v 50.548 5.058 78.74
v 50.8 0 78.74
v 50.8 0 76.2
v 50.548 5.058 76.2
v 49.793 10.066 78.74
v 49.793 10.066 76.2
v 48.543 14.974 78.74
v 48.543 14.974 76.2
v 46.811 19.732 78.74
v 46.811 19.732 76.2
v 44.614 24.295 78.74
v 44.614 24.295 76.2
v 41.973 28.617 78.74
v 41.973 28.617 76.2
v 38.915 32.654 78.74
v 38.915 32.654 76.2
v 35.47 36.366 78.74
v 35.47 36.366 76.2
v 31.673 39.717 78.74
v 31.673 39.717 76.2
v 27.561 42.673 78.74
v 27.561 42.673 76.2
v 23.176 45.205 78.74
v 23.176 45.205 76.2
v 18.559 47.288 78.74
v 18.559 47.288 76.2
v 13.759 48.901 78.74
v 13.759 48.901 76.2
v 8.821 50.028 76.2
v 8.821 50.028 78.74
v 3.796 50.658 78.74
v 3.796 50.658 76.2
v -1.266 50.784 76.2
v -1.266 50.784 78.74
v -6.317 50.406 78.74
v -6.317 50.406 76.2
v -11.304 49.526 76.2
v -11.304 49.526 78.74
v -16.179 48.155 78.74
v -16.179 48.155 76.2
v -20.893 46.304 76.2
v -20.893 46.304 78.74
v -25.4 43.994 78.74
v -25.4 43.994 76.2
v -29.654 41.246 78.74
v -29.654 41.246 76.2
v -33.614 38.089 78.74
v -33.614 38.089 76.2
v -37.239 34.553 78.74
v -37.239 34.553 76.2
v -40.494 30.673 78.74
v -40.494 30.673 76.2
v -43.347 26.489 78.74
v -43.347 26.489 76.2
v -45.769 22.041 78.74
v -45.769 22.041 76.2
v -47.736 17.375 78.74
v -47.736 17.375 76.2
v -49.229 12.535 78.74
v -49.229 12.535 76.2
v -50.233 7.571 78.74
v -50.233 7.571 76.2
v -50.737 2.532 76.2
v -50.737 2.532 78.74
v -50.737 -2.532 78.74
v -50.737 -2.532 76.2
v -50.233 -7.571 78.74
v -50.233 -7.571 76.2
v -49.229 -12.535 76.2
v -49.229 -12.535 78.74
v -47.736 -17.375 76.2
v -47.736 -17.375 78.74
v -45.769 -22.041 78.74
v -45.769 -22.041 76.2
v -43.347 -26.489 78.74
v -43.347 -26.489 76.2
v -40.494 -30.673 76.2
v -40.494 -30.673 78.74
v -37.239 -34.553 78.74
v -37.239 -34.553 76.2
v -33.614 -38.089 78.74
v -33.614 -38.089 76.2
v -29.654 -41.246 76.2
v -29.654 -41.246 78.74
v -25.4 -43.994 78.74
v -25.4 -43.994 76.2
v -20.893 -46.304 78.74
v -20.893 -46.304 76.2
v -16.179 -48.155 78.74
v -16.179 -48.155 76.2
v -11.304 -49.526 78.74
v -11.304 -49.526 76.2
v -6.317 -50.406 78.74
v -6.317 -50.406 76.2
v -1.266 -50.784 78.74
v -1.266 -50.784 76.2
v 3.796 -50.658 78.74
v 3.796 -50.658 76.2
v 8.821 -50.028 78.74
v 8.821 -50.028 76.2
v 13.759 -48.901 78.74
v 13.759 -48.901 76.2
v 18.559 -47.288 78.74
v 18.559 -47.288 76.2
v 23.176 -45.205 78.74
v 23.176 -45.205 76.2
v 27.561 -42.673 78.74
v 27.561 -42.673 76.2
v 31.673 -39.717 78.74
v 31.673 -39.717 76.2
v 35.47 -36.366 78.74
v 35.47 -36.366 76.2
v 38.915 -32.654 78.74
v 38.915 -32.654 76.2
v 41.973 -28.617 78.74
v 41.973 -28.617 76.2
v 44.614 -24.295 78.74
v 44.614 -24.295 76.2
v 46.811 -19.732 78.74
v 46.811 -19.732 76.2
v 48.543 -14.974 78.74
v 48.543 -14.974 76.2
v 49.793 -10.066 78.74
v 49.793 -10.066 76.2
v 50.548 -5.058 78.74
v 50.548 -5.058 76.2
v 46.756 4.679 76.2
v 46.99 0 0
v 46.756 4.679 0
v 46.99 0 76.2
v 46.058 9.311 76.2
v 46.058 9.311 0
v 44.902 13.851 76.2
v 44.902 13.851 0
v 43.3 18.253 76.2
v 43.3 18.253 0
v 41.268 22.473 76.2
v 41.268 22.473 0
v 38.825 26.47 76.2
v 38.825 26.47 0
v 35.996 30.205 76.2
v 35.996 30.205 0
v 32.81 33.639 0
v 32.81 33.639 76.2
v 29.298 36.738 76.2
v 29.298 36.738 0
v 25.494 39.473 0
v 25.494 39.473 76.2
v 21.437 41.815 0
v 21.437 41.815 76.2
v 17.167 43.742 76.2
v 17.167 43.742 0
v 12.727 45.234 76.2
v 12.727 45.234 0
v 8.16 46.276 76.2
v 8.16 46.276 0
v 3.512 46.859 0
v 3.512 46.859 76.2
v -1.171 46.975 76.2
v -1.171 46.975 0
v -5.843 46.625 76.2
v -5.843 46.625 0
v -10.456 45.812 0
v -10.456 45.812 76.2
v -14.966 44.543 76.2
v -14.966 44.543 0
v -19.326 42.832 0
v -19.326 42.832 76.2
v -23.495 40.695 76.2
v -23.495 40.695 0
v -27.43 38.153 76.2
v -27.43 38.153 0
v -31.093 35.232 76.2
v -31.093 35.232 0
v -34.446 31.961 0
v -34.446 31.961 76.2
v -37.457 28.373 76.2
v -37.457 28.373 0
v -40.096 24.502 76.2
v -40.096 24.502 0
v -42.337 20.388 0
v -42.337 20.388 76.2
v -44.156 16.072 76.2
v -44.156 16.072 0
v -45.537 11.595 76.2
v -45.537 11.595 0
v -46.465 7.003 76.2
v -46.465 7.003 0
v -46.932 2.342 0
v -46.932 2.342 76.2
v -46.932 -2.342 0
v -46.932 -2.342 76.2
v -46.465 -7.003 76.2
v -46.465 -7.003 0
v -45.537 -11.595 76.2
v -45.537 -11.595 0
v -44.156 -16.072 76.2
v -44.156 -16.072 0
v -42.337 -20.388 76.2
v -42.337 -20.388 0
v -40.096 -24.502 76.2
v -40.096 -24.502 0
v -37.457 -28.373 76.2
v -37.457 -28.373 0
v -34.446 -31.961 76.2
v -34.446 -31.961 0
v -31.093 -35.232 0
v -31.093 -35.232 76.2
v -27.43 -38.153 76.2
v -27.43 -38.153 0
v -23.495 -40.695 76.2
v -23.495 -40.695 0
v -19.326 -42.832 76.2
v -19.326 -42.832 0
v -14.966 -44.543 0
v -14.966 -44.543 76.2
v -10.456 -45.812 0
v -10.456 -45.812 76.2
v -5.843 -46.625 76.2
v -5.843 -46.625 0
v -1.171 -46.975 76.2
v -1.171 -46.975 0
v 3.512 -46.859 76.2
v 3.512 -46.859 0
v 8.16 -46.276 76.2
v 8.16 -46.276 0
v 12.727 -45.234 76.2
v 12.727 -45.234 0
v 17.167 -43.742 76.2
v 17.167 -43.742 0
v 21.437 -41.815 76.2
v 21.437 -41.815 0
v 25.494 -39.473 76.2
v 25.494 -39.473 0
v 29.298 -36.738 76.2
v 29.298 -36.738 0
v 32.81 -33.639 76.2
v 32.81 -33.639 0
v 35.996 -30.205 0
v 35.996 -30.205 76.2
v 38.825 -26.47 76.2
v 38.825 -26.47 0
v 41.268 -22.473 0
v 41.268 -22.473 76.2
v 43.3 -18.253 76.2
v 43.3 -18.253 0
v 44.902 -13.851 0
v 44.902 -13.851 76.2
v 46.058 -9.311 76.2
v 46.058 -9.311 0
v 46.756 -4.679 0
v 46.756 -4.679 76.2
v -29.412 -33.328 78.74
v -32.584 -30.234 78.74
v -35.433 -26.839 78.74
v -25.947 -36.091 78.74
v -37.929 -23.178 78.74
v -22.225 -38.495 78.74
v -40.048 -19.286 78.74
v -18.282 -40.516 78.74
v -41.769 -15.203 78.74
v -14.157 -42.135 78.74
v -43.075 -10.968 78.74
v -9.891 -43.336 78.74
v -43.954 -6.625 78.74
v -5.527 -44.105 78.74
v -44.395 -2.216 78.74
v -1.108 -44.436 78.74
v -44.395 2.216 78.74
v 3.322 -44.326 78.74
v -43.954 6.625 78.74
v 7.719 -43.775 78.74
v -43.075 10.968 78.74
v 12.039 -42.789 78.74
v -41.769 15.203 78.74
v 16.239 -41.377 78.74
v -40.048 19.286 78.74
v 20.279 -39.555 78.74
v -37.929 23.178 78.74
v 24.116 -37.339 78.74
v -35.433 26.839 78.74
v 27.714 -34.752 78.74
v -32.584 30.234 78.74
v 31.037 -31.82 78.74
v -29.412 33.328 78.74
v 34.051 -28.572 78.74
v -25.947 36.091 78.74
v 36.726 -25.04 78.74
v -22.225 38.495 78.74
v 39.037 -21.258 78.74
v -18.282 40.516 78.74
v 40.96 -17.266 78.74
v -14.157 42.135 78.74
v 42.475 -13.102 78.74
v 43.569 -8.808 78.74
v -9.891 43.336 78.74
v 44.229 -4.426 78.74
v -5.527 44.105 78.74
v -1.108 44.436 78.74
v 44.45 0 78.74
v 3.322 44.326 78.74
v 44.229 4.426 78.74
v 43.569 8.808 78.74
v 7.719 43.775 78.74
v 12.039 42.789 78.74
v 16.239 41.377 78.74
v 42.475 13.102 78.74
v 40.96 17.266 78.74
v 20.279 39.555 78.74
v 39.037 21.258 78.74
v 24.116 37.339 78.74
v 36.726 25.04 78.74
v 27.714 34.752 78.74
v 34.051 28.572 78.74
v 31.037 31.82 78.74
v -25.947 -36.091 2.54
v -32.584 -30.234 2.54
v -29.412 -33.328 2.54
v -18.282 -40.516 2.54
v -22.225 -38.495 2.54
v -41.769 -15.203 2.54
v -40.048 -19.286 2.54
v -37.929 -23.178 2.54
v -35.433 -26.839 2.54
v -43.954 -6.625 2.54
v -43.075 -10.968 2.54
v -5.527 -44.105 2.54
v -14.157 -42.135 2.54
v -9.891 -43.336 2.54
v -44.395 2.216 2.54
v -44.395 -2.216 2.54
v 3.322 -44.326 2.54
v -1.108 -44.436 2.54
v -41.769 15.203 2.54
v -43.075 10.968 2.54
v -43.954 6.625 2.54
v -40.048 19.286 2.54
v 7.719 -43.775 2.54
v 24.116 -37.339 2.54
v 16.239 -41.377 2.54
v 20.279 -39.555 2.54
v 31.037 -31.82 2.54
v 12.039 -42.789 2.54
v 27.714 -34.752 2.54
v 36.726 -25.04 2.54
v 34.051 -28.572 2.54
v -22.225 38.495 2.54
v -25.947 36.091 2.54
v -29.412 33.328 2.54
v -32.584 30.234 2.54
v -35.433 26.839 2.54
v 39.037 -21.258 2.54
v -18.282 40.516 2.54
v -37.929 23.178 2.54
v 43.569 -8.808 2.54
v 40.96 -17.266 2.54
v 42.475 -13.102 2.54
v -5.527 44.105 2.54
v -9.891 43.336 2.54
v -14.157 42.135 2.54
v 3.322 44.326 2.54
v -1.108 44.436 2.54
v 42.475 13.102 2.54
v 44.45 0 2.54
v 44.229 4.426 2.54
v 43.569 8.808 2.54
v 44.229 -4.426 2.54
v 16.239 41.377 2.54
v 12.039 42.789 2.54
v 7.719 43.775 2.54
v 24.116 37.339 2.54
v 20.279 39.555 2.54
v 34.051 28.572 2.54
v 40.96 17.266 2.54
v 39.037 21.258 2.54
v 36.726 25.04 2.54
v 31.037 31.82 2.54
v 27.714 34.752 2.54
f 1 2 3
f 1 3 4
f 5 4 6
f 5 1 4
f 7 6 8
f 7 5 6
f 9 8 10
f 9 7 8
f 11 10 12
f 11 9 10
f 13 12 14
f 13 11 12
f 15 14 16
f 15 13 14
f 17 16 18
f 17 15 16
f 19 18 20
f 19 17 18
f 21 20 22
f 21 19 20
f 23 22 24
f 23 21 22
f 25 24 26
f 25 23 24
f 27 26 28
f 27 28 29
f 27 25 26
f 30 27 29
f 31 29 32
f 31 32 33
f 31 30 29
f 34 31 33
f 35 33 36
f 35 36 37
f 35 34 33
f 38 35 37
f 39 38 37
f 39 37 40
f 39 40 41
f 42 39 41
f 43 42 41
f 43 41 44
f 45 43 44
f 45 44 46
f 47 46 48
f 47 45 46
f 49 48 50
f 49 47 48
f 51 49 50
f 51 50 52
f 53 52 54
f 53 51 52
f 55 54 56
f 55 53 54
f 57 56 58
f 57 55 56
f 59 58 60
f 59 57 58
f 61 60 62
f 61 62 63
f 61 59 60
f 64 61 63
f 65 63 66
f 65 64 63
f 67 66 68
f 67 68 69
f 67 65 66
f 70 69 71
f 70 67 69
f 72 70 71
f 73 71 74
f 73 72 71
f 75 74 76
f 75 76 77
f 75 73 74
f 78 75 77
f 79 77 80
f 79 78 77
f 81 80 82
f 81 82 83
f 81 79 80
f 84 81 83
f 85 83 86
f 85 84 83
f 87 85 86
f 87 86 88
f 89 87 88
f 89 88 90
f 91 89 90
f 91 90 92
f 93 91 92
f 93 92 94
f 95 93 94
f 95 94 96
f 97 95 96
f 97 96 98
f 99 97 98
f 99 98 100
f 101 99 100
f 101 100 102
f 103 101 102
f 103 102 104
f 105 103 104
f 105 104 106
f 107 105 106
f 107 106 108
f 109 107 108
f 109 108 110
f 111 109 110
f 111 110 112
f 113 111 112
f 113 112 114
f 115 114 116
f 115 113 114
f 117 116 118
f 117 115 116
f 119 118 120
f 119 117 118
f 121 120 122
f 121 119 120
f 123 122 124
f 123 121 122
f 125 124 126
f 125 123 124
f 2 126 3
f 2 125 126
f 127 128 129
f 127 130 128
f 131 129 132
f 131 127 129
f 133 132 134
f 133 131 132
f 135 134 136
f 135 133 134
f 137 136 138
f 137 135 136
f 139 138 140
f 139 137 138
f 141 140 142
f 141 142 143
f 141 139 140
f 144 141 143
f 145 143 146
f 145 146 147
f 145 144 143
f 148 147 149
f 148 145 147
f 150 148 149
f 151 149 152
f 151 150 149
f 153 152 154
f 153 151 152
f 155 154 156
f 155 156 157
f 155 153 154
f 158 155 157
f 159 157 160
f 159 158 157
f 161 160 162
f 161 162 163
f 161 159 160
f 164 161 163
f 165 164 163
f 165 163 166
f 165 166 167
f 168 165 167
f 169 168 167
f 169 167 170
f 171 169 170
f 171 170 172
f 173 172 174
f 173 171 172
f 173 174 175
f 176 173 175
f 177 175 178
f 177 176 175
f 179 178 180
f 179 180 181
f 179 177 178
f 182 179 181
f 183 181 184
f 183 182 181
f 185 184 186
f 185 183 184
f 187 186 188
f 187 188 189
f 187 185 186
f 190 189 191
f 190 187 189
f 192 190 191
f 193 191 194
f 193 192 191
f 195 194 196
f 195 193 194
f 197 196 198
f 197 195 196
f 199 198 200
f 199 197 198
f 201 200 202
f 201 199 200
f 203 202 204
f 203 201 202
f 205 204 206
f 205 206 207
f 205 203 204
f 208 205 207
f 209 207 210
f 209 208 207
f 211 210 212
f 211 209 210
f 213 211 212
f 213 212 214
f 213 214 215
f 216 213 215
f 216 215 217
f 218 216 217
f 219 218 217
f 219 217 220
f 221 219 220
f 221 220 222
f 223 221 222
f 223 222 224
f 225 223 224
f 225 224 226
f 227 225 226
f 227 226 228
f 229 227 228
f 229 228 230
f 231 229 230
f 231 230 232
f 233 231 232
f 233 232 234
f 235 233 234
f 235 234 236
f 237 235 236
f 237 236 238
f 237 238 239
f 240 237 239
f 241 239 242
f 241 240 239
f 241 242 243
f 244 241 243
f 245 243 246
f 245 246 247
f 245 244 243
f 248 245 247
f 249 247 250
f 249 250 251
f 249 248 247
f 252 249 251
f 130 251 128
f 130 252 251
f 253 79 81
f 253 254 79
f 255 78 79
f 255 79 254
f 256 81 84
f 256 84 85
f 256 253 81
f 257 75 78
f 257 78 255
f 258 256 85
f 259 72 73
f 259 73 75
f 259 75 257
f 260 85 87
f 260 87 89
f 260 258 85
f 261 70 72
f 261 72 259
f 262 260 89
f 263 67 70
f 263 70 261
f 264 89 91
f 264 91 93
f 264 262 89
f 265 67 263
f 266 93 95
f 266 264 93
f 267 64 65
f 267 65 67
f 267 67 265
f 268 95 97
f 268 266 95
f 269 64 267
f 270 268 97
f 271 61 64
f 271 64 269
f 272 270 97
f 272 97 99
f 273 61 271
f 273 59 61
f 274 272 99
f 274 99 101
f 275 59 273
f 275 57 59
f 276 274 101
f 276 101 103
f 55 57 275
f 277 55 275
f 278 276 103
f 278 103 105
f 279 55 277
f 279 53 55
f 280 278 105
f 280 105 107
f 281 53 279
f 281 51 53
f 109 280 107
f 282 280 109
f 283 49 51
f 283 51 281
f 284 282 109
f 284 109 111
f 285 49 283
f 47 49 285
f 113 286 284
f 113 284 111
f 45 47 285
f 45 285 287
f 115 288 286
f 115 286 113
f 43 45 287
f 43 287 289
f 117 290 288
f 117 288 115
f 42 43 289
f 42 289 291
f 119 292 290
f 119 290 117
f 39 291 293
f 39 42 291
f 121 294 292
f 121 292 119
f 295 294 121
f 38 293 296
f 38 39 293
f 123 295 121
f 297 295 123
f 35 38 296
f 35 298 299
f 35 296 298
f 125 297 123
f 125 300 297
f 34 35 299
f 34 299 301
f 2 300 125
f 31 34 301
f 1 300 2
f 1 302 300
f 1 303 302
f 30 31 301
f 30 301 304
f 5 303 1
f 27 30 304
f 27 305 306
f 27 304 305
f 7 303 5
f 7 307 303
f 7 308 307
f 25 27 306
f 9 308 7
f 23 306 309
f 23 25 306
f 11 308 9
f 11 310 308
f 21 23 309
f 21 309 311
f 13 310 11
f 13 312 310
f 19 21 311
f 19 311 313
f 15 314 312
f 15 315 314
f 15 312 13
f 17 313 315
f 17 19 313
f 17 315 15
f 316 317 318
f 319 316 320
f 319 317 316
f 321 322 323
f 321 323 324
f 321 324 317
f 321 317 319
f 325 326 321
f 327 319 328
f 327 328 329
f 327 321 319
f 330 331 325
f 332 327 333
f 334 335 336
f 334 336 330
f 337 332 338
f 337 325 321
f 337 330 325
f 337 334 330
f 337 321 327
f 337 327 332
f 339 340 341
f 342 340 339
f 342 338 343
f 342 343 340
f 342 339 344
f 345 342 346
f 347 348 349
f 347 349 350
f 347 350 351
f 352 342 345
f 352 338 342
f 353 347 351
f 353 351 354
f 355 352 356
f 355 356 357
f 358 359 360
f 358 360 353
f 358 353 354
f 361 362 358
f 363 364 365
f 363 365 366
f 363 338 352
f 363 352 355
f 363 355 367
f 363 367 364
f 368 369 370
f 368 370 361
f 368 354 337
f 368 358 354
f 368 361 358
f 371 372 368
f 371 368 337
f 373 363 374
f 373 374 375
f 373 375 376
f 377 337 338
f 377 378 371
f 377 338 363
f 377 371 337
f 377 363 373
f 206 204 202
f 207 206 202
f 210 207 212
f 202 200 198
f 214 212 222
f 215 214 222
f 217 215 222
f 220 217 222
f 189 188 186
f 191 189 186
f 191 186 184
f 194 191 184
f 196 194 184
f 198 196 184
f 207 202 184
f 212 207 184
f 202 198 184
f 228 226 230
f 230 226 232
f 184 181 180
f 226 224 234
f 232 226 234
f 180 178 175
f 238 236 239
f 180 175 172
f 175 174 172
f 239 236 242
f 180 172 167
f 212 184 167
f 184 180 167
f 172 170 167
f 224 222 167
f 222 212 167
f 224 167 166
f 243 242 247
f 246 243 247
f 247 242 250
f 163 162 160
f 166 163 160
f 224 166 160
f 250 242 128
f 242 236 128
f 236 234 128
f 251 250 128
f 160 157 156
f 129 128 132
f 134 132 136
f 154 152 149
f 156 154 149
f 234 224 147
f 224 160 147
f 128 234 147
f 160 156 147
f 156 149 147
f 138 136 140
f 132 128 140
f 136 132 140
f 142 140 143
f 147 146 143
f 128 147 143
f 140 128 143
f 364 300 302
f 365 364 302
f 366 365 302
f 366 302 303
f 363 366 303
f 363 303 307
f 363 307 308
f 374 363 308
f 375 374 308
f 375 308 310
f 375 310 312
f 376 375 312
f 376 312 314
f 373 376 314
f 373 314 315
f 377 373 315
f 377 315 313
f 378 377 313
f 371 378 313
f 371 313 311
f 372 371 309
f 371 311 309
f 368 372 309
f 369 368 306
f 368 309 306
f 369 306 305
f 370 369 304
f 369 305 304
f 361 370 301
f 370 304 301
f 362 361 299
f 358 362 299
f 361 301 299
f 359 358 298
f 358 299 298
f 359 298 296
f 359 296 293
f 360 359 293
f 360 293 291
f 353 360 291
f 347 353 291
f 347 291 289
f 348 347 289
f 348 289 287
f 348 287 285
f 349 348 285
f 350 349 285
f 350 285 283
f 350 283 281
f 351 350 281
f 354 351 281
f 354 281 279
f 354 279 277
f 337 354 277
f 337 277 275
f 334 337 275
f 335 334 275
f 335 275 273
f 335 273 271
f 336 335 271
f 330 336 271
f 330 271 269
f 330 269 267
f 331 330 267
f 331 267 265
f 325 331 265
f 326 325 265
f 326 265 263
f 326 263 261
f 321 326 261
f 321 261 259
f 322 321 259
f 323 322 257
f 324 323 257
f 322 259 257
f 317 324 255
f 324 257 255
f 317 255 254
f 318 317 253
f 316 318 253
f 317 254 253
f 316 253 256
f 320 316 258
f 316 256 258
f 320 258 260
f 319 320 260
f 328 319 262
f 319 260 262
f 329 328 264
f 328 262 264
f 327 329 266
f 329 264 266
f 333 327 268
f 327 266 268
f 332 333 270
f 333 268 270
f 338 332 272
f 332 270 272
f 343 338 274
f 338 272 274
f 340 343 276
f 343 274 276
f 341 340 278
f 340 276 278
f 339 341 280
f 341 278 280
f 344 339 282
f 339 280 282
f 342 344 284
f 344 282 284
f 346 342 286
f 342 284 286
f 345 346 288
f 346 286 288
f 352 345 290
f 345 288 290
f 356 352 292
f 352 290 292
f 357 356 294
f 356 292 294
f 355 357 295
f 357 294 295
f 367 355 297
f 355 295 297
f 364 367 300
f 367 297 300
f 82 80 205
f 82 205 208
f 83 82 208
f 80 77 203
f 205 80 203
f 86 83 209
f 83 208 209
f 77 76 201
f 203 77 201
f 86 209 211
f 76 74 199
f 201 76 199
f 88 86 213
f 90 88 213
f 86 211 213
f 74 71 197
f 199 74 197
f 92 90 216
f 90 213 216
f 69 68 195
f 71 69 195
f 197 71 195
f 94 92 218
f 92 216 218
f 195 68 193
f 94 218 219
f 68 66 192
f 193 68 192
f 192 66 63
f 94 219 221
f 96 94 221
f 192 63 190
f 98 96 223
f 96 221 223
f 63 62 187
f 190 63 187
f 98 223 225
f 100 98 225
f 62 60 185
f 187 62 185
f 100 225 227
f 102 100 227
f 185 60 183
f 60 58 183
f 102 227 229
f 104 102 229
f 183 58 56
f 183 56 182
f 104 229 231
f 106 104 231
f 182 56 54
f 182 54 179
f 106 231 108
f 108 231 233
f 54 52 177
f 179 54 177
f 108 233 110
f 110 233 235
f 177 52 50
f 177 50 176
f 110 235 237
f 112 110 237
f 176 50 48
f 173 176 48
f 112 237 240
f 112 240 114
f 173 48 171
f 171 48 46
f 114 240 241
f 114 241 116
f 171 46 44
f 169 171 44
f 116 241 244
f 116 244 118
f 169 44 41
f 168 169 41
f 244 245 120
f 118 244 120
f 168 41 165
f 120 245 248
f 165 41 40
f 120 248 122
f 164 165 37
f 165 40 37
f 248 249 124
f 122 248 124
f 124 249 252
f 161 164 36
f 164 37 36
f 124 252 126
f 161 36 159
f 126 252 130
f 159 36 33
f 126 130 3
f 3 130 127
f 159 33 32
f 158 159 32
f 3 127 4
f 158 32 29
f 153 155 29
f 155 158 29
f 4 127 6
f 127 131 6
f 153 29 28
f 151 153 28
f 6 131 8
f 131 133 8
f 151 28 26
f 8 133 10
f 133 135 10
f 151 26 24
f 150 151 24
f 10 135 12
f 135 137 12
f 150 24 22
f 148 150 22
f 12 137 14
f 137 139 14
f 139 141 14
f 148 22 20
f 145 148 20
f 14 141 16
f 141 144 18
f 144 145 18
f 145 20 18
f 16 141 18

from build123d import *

# Parameters (mm, degrees)
F0_R     = 46.99
F2_R     = 46.99
F4_T     = -2.54
F6_R     = 50.8
F6_R_2   = 44.45
F7_DEPTH = 2.54


with BuildPart() as f3:
    # F0 (on Top) → F3 section 0
    with BuildSketch(Plane.XY):
        Circle(F0_R)
    # F2 (on offset) → F3 section 1
    with BuildSketch(Plane.XY.offset(76.2)):
        Circle(F2_R)
    loft()

    # F4
    f4_openings = [f3.faces().sort_by_distance(p)[0] for p in [
        (0, 0, 76.2),
    ]]
    offset(amount=F4_T, openings=f4_openings)

    # F6 (on offset) → F7 (join)
    with BuildSketch(Plane.XY.offset(78.74)):
        Circle(F6_R)
        Circle(F6_R_2, mode=Mode.SUBTRACT)
    extrude(amount=-F7_DEPTH)


solid = f3.part
